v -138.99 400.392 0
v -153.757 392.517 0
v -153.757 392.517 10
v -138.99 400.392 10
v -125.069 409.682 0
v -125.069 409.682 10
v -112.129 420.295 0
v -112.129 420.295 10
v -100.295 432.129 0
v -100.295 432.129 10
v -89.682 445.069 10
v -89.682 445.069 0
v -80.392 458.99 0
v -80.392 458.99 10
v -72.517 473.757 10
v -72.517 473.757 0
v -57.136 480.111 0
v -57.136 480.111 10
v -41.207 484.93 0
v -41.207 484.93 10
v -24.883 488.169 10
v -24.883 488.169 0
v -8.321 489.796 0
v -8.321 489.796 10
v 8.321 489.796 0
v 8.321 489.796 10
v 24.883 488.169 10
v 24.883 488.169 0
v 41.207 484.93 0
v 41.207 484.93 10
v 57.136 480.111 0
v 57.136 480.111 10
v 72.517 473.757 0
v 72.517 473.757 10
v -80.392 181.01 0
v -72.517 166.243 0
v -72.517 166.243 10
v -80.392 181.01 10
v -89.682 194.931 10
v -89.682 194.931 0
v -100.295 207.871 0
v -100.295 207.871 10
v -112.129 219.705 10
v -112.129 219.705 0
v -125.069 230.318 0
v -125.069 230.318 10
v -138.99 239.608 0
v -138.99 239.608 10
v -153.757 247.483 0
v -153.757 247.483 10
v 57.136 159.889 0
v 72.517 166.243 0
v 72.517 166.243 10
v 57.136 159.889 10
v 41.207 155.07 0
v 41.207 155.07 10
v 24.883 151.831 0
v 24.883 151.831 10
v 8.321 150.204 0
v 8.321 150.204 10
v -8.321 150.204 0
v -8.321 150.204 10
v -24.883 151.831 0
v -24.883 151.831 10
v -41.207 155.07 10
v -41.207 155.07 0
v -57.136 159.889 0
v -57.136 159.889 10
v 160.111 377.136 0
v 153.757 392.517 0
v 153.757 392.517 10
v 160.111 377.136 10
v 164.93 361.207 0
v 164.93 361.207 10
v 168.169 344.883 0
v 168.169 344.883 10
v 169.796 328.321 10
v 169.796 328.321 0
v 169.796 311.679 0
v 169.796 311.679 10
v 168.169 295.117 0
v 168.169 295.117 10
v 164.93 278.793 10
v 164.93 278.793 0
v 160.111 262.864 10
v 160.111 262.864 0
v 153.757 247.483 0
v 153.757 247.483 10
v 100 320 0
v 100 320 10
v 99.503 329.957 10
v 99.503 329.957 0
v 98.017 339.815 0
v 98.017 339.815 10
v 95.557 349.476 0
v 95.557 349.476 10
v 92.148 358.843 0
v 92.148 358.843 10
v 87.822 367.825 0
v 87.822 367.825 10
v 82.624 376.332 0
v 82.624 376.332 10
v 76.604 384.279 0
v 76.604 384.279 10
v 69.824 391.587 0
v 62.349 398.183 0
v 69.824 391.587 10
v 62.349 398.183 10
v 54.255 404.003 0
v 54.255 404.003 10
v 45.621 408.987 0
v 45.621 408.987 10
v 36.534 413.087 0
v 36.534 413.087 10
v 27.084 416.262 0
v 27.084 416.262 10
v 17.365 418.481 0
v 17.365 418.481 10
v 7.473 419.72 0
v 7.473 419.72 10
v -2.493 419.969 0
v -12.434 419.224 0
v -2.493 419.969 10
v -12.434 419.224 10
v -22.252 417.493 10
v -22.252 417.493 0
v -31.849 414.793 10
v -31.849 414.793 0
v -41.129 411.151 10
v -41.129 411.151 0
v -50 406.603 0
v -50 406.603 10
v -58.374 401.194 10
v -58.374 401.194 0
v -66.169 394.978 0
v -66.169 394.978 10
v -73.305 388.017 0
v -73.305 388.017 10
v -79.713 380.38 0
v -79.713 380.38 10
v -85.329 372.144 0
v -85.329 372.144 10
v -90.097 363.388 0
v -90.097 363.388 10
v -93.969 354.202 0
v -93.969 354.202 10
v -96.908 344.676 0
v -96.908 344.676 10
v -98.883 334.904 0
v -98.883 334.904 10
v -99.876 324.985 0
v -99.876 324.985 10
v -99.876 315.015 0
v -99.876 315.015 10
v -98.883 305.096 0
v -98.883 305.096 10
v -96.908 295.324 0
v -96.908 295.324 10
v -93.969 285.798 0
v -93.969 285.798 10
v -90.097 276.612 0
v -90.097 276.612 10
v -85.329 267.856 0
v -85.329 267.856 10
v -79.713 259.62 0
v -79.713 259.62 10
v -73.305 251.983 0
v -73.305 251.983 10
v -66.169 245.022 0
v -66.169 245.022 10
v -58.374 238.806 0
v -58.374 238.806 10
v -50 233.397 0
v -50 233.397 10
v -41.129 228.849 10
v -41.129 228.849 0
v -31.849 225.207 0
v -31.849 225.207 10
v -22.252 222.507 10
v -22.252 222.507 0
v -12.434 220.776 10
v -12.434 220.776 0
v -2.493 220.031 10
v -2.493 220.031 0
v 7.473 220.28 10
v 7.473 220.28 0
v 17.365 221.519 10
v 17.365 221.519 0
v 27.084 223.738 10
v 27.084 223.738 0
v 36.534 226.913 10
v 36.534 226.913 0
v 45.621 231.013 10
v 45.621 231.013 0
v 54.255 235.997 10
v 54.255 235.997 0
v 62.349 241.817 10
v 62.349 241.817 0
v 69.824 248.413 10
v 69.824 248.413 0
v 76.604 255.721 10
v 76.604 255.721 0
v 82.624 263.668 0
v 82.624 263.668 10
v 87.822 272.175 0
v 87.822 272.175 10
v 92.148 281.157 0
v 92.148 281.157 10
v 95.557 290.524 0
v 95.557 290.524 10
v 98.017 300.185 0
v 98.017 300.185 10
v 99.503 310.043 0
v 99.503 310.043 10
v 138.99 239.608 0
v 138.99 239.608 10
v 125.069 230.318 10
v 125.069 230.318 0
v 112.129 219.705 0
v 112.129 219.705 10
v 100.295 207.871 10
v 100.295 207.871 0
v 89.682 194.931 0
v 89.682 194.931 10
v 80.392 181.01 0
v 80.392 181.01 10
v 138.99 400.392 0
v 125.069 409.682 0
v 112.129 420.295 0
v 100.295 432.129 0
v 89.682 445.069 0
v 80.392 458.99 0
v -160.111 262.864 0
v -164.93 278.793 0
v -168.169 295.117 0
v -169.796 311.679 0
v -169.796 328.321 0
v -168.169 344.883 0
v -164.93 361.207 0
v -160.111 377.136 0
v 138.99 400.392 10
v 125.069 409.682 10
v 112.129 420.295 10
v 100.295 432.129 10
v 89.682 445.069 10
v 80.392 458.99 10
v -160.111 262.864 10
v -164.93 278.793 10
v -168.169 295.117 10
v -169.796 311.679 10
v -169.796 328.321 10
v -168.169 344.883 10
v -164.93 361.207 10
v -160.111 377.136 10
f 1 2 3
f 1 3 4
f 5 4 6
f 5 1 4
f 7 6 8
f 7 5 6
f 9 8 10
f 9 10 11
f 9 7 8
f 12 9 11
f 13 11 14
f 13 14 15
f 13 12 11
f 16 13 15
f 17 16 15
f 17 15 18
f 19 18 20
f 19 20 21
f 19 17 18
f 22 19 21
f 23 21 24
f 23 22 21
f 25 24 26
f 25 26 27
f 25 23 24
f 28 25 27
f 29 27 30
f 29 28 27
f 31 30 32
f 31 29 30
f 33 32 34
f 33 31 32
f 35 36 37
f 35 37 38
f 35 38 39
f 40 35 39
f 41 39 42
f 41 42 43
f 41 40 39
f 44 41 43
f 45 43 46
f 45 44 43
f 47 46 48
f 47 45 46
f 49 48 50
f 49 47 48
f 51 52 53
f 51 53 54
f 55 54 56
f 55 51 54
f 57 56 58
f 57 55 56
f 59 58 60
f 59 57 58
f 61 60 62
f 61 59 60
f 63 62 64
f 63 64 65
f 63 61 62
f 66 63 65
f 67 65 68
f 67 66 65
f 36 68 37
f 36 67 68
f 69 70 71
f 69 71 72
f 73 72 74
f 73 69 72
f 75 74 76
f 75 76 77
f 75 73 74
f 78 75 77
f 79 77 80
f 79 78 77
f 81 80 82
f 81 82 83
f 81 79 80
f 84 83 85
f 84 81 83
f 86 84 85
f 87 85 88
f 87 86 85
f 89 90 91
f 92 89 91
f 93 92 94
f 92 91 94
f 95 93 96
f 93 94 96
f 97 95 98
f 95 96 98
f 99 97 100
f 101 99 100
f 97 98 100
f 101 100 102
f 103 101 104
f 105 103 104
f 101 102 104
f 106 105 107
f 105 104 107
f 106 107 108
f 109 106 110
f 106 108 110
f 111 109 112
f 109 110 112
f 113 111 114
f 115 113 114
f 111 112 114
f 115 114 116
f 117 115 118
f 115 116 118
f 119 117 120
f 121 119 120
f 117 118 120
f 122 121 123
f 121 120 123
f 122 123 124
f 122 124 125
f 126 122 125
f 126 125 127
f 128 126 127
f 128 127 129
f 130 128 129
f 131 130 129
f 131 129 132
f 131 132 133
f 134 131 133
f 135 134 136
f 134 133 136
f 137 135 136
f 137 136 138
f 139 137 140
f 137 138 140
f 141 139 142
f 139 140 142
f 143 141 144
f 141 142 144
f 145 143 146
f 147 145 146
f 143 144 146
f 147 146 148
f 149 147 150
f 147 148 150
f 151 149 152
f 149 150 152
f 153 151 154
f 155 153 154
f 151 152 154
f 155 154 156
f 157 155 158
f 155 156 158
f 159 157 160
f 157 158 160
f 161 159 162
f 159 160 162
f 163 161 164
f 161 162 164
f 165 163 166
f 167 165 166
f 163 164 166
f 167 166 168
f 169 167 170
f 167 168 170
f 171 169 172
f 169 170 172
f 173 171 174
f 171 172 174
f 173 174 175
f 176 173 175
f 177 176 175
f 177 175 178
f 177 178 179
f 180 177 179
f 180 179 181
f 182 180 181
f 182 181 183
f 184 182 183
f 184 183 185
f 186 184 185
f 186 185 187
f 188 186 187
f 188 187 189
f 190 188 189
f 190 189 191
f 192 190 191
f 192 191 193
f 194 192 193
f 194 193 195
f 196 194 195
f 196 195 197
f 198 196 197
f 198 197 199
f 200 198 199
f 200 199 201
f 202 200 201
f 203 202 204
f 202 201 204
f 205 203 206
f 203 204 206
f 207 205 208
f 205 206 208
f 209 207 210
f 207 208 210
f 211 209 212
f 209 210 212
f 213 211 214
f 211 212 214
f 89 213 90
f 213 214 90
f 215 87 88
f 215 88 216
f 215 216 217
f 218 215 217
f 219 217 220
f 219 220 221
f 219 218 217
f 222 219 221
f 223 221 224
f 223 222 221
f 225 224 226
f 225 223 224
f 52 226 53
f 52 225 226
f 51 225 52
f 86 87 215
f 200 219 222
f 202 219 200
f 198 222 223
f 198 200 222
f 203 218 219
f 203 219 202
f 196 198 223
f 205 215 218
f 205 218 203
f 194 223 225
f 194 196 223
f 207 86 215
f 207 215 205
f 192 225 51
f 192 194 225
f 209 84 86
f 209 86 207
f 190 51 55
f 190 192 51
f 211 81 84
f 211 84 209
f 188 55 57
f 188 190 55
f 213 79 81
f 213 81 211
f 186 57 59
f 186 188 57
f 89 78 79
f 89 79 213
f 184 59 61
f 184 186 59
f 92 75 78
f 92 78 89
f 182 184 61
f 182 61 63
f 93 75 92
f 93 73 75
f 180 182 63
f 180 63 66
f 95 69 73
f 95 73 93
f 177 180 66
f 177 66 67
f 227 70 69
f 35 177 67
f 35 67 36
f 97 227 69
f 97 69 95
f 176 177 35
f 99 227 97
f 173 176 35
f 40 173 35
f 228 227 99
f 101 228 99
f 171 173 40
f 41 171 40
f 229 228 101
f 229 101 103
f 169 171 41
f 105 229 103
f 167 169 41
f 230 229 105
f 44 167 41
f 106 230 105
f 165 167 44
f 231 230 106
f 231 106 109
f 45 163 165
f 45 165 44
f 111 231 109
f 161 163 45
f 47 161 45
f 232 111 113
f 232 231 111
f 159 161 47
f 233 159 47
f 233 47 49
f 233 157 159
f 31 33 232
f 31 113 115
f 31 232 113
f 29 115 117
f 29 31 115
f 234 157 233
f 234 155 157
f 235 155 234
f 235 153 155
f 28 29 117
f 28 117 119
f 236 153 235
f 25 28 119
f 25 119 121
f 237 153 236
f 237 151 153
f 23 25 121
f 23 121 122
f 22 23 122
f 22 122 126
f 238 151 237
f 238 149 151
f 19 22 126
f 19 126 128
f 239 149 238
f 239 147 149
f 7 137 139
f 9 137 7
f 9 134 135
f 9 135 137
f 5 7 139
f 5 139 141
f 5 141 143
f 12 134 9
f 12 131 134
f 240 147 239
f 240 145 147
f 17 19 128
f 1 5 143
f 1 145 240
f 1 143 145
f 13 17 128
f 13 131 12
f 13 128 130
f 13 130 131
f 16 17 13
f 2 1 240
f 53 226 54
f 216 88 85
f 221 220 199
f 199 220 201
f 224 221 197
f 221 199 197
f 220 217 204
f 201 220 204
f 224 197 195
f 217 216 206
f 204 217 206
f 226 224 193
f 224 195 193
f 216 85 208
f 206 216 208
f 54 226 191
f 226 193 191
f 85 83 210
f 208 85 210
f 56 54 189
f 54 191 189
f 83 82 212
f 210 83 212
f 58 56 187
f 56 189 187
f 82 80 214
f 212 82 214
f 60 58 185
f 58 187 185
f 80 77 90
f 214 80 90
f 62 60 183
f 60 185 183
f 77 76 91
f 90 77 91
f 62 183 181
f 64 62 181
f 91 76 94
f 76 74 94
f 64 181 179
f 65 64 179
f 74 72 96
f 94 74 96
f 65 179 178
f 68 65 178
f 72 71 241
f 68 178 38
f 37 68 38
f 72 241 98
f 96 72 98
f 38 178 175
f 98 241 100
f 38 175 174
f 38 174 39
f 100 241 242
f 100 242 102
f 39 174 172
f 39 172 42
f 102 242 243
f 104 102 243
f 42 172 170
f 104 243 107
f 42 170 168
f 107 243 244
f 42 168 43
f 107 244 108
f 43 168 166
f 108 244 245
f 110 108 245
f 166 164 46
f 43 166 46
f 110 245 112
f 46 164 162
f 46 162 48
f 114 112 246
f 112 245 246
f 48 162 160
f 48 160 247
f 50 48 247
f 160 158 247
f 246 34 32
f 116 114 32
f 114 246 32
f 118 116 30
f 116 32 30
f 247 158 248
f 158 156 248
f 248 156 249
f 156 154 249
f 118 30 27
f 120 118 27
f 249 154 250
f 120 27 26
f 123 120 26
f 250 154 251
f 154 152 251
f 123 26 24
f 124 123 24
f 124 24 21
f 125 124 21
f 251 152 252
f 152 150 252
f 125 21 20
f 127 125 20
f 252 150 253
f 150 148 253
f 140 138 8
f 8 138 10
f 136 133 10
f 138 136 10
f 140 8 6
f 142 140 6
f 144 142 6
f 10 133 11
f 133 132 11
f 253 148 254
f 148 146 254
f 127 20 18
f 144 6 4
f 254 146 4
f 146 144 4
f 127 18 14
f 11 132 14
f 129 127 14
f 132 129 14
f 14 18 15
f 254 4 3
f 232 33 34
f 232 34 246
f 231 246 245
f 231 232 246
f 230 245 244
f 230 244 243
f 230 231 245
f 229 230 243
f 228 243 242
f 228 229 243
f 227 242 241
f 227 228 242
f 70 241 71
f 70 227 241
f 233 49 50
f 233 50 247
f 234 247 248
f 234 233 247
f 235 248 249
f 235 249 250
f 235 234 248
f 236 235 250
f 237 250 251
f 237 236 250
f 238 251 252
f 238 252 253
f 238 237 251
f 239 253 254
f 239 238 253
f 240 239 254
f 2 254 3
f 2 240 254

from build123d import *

# Parameters (mm, degrees)
SALIENTE_EXTRUIR1_DEPTH = 10
CROQUIS2_R              = 100
CORTAR_EXTRUIR1_DEPTH   = 10


with BuildPart() as part:
    # Croquis1 → Saliente-Extruir1 (new body)
    with BuildSketch(Plane.XY):
        with BuildLine():
            ThreePointArc((-72.516892967, 473.757277013), (0, 490), (72.516892967, 473.757277013))
            ThreePointArc((72.516892967, 473.757277013), (106.066017178, 426.066017178), (153.757277013, 392.516892967))
            ThreePointArc((153.757277013, 392.516892967), (170, 320), (153.757277013, 247.483107033))
            ThreePointArc((153.757277013, 247.483107033), (106.066017178, 213.933982822), (72.516892967, 166.242722987))
            ThreePointArc((72.516892967, 166.242722987), (0, 150), (-72.516892967, 166.242722987))
            ThreePointArc((-72.516892967, 166.242722987), (-106.066017178, 213.933982822), (-153.757277013, 247.483107033))
            ThreePointArc((-153.757277013, 247.483107033), (-170, 320), (-153.757277013, 392.516892967))
            ThreePointArc((-153.757277013, 392.516892967), (-106.066017178, 426.066017178), (-72.516892967, 473.757277013))
        make_face()
    extrude(amount=SALIENTE_EXTRUIR1_DEPTH)

    # Croquis2 → Cortar-Extruir1 (cut)
    with BuildSketch(Plane.XY.offset(10)):
        with Locations((0, 320)):
            Circle(CROQUIS2_R)
    extrude(amount=-CORTAR_EXTRUIR1_DEPTH, mode=Mode.SUBTRACT)


solid = part.part
